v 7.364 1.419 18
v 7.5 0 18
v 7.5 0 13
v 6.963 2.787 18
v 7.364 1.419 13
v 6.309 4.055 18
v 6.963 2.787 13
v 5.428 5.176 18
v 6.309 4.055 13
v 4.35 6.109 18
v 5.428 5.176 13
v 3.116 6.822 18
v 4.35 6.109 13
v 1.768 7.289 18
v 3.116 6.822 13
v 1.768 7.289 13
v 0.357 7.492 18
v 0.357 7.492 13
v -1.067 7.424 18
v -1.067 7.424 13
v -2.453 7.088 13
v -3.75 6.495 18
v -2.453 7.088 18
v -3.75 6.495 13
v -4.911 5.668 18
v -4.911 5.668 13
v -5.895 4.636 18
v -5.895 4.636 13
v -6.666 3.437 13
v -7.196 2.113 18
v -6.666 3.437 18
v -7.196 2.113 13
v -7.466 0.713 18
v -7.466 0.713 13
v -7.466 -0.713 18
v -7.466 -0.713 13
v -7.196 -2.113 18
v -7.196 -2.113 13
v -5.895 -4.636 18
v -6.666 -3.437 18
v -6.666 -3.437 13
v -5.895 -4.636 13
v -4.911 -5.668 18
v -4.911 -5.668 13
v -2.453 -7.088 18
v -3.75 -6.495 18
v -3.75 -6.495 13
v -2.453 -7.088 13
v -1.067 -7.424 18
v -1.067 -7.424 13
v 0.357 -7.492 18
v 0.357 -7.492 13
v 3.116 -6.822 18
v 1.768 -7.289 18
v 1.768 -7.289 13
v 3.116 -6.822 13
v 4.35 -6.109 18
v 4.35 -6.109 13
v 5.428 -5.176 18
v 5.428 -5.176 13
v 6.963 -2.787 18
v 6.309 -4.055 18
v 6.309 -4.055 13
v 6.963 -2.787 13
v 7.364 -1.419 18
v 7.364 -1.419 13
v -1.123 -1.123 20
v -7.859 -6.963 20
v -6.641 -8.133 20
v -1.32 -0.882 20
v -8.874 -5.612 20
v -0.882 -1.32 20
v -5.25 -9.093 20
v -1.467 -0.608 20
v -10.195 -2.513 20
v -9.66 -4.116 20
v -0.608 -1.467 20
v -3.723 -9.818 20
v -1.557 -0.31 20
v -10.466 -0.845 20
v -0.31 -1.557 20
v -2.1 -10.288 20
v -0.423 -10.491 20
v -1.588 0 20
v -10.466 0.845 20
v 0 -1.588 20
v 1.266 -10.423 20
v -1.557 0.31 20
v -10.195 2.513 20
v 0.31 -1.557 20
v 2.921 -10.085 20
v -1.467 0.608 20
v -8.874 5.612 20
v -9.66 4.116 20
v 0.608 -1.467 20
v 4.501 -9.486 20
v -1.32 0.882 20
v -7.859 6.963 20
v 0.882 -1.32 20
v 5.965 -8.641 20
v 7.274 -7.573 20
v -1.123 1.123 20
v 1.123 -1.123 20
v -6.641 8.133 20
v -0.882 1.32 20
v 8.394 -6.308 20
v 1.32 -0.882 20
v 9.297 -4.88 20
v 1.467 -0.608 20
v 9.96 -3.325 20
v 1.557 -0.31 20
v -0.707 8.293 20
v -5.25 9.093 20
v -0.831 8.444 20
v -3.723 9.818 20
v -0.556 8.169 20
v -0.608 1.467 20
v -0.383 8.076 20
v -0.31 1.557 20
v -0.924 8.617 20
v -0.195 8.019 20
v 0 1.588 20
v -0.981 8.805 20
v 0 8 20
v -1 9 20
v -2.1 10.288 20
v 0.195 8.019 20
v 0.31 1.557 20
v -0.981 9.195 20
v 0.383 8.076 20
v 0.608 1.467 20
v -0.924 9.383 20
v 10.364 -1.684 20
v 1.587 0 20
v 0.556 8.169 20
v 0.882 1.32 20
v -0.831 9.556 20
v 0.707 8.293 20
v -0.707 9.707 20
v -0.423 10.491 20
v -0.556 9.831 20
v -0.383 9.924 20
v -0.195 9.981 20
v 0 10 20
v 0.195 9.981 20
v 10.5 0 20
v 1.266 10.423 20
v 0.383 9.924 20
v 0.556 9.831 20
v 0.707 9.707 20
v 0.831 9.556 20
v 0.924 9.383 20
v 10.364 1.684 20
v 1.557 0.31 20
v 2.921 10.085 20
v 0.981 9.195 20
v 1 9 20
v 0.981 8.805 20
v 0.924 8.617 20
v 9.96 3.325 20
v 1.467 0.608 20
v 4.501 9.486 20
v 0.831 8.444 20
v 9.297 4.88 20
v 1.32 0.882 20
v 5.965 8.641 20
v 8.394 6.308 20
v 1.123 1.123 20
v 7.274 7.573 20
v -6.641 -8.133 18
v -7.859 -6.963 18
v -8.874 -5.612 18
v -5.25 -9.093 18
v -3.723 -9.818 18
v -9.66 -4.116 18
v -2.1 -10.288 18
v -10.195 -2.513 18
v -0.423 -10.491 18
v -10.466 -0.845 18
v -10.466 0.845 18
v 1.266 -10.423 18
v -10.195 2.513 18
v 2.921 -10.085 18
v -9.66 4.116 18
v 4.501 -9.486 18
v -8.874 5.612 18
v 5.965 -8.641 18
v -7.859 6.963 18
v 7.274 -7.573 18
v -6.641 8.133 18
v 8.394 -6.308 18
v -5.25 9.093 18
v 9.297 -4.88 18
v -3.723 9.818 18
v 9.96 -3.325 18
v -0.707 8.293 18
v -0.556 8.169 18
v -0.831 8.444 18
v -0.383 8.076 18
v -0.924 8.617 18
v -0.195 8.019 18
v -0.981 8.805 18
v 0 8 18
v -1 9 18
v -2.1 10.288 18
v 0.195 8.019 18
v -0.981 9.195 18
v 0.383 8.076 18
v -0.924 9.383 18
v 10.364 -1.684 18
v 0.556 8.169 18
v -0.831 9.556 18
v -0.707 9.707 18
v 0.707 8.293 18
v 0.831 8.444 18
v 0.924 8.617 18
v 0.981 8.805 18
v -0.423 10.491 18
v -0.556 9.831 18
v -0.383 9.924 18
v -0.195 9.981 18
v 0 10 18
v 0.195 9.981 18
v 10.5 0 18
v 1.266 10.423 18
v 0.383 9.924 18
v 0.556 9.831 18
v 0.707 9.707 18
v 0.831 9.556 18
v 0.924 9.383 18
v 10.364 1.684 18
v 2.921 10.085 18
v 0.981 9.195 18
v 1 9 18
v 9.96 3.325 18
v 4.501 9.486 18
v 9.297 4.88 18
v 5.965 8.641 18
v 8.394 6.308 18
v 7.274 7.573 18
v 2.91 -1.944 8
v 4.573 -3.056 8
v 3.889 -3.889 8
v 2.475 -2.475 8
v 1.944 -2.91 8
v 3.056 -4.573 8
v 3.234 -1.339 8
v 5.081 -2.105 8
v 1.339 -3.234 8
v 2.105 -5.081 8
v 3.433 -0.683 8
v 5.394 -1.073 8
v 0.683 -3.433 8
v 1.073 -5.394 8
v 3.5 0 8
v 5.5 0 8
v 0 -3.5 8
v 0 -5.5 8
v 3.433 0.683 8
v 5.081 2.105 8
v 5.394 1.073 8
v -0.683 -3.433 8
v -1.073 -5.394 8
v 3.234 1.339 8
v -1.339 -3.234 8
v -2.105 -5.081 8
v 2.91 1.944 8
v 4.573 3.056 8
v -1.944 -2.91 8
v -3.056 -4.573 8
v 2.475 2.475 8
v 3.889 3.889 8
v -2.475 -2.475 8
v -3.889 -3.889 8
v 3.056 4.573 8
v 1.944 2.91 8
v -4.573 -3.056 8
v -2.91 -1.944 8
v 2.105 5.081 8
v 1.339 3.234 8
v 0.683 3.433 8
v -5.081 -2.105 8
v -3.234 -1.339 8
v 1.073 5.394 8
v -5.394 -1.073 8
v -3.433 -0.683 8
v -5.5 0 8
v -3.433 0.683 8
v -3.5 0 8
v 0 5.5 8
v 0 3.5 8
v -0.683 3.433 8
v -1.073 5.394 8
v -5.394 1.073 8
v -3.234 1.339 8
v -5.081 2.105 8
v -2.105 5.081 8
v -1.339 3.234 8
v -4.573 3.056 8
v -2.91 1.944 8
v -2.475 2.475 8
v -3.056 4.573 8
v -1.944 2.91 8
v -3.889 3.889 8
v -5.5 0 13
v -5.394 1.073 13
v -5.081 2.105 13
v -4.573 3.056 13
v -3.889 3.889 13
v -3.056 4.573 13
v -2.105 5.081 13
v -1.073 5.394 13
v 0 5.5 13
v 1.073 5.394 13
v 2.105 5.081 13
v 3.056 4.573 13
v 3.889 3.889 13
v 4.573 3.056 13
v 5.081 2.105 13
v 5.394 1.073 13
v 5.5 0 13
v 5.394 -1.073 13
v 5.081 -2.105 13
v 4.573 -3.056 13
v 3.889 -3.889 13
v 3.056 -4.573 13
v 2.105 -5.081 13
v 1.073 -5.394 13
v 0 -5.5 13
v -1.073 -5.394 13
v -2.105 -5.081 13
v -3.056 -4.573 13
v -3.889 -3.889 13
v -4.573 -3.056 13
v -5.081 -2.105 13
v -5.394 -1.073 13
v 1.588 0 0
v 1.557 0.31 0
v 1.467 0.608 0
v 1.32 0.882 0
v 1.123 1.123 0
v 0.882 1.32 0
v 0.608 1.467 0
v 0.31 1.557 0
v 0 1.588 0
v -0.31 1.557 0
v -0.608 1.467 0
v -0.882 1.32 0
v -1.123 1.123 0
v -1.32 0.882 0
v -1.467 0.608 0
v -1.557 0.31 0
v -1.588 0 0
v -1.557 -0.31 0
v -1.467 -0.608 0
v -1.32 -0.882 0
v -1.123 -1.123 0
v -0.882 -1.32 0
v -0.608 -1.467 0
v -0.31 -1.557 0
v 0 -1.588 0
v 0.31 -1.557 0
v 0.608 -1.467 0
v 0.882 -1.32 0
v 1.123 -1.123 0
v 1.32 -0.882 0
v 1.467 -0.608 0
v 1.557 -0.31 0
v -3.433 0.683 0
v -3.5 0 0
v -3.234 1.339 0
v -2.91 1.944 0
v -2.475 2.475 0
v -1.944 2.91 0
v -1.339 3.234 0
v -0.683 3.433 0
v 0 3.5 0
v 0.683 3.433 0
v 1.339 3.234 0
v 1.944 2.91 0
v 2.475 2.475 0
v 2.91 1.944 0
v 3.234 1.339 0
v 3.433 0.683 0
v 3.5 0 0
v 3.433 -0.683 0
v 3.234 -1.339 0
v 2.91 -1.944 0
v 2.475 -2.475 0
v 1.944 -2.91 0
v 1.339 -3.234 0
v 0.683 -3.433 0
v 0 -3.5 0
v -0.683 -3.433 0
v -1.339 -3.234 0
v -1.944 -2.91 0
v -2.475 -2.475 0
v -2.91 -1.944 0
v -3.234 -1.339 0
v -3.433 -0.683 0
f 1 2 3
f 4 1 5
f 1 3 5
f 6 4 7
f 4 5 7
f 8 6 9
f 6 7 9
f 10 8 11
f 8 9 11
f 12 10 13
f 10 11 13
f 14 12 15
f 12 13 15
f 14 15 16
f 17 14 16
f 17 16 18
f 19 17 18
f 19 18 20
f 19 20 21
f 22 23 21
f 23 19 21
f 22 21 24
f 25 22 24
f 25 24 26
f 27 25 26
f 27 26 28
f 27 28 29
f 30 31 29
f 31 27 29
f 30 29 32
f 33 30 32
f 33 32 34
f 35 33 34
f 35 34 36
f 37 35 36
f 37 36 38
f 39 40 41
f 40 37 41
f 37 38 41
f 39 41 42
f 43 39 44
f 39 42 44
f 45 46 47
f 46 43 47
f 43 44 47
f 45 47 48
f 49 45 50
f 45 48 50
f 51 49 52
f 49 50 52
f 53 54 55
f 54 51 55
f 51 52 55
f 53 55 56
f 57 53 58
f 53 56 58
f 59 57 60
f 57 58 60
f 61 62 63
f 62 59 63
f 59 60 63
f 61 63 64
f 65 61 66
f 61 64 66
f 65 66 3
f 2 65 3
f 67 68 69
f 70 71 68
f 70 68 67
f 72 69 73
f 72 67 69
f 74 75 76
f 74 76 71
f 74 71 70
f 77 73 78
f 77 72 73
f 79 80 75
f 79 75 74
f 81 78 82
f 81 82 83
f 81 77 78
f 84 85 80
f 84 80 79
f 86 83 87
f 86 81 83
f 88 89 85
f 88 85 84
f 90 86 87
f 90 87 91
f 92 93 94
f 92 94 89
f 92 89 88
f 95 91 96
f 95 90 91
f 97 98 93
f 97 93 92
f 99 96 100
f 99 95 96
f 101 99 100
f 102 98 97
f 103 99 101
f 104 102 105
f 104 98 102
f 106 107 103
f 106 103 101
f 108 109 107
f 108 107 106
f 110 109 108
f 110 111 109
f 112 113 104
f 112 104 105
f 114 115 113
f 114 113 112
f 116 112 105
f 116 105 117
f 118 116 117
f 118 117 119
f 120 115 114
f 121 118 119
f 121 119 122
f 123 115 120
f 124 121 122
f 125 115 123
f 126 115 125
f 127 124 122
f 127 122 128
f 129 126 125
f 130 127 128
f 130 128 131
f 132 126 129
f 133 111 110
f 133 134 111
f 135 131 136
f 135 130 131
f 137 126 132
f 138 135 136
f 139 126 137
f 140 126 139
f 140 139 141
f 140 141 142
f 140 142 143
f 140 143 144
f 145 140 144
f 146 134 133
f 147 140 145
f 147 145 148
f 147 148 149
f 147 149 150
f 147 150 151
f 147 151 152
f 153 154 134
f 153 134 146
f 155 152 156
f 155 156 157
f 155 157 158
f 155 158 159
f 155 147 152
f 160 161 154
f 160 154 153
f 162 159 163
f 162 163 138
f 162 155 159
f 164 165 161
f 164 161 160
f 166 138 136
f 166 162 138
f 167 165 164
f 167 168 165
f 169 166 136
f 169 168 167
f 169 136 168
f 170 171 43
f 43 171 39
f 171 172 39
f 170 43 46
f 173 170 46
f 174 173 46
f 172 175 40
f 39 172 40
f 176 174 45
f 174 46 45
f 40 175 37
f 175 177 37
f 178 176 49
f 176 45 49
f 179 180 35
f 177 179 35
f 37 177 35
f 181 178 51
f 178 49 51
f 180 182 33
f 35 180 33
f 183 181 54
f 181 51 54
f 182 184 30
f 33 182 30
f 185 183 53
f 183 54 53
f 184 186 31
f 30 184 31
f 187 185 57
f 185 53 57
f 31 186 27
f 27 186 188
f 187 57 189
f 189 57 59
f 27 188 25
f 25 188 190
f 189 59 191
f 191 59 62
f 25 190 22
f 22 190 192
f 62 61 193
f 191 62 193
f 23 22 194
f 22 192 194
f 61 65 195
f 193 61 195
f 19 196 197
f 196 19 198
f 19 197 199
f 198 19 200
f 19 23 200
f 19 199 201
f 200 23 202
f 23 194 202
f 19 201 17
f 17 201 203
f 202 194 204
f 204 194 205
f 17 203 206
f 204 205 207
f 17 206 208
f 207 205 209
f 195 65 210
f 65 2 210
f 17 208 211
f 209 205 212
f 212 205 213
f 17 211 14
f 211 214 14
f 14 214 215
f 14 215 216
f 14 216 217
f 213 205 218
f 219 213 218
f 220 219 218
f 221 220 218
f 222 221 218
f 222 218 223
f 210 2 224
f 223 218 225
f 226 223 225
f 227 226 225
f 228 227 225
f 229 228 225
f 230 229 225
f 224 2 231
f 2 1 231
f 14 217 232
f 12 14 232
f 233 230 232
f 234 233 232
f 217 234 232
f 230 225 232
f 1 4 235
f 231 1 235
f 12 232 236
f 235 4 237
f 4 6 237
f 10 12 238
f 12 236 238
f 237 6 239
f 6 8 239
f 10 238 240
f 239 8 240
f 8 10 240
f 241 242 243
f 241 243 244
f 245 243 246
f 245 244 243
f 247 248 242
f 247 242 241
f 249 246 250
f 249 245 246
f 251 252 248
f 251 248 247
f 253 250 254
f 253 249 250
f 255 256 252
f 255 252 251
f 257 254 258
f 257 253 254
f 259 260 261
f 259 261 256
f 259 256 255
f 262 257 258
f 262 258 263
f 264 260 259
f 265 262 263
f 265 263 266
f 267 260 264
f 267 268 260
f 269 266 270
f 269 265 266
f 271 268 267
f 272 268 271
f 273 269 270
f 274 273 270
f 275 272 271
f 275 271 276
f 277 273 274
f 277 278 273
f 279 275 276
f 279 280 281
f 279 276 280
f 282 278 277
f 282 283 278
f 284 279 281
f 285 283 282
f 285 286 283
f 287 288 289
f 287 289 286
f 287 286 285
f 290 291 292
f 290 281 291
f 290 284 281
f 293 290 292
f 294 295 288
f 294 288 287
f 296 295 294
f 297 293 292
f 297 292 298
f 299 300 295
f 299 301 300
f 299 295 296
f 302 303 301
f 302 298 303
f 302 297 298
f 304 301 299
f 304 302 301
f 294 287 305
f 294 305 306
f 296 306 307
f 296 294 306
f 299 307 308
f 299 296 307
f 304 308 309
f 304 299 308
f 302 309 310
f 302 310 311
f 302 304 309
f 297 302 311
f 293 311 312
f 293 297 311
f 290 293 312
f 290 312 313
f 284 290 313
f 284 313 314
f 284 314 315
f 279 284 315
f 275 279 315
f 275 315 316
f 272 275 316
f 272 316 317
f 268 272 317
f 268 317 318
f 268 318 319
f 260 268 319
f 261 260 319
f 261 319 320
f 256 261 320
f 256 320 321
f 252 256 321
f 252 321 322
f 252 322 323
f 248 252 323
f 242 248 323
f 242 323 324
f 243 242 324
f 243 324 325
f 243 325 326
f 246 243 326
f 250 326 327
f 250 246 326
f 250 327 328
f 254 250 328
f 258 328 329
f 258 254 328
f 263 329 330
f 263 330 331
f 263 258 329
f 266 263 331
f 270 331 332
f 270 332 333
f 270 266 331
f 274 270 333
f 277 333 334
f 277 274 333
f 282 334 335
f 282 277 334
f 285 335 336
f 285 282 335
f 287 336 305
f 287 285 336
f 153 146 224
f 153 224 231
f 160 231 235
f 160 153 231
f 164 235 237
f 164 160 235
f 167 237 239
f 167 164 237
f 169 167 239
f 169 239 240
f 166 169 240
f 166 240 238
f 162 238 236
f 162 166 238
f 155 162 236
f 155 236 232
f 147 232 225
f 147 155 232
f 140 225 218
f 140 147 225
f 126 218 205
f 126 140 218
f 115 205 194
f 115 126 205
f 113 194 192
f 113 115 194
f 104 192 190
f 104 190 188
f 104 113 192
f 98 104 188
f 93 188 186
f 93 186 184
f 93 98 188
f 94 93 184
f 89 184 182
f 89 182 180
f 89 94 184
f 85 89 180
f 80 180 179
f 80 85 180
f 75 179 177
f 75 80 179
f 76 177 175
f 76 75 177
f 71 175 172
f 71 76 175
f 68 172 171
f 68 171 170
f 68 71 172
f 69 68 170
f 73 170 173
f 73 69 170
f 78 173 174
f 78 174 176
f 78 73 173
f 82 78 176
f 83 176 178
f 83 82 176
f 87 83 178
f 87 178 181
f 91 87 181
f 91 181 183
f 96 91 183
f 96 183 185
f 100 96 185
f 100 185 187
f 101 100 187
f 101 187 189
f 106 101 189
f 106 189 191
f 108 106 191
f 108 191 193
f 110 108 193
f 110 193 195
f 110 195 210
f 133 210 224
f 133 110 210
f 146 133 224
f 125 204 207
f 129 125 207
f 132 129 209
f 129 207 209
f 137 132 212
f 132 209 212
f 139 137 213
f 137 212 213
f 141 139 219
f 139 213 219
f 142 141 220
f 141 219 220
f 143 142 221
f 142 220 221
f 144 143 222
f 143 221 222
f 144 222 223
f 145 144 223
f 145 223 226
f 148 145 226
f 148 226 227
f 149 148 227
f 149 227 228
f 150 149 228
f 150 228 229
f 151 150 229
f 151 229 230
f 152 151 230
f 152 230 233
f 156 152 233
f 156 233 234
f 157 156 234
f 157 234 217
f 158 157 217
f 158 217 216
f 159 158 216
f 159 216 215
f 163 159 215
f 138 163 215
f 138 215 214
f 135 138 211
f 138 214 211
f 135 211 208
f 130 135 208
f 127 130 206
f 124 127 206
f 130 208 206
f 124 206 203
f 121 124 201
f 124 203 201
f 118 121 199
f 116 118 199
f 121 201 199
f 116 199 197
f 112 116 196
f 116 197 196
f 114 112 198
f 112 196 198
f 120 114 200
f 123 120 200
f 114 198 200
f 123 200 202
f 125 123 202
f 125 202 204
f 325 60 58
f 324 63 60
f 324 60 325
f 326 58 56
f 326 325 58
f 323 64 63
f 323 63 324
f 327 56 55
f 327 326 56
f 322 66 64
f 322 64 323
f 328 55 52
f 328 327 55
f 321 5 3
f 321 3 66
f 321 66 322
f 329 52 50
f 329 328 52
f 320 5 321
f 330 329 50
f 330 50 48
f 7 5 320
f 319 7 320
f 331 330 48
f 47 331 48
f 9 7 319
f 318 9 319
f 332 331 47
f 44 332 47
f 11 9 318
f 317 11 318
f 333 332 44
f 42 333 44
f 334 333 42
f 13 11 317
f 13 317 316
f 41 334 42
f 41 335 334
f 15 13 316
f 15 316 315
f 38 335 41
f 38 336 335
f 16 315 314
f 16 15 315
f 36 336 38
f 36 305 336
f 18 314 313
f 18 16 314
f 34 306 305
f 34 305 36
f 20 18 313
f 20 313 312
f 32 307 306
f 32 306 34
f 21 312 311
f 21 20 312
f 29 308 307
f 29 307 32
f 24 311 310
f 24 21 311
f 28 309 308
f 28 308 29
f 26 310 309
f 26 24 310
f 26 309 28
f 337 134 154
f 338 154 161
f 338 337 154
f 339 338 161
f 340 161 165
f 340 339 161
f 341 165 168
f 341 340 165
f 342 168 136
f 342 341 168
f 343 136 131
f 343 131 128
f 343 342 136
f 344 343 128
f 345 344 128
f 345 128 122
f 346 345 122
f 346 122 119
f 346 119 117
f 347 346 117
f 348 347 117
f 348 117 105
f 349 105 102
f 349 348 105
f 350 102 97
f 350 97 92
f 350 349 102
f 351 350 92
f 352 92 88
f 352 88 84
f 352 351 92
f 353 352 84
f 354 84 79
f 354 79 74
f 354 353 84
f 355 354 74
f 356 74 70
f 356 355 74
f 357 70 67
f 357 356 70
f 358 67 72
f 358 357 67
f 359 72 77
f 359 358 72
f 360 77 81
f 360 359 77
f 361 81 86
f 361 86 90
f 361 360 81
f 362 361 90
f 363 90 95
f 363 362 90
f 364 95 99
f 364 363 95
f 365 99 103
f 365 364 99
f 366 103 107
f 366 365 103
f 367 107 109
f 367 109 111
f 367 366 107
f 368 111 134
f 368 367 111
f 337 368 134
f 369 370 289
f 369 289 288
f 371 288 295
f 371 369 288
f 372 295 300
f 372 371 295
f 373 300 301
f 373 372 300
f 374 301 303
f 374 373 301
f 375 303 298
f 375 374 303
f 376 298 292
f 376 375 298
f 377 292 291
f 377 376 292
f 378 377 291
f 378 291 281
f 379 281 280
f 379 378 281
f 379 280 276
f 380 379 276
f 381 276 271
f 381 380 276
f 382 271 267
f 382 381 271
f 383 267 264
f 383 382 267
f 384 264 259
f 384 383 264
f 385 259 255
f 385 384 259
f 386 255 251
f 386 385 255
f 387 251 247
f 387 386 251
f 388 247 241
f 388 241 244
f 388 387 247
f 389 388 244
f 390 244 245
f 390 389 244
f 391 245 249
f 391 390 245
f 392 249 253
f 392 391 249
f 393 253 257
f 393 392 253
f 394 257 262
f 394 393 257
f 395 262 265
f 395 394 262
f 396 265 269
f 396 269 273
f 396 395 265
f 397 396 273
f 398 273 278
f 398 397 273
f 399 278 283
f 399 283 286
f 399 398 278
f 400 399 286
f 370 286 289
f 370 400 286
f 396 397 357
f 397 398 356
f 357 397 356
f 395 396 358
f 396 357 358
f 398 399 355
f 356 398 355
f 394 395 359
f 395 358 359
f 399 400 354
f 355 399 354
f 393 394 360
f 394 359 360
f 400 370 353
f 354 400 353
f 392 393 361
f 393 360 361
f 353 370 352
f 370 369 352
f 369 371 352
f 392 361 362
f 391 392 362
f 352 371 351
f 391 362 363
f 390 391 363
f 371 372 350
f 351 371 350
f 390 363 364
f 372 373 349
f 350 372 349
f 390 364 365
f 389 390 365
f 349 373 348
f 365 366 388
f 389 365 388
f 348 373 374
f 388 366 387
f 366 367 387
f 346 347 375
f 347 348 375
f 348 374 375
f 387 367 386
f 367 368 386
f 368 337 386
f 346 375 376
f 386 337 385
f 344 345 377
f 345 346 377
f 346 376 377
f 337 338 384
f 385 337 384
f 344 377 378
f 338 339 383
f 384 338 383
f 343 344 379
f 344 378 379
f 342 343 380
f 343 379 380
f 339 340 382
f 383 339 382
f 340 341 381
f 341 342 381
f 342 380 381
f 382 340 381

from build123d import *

# Parameters (mm, degrees)
SKETCH1_R           = 7.5
SKETCH1_R_2         = 1.5875
BOSS_EXTRUDE1_DEPTH = 20
SKETCH2_R           = 10.5
SKETCH2_R_2         = 7.5
SKETCH2_R_3         = 1.5875
BOSS_EXTRUDE2_DEPTH = 2
SKETCH3_R           = 1
CUT_EXTRUDE1_DEPTH  = 3
SKETCH4_R           = 7.5
SKETCH4_R_2         = 5.5
CUT_EXTRUDE2_DEPTH  = 13
SKETCH5_R           = 5.5
SKETCH5_R_2         = 3.5
CUT_EXTRUDE3_DEPTH  = 8


with BuildPart() as part:
    # Sketch1 → Boss-Extrude1 (new body)
    with BuildSketch(Plane.XY):
        Circle(SKETCH1_R)
        Circle(SKETCH1_R_2, mode=Mode.SUBTRACT)
    extrude(amount=BOSS_EXTRUDE1_DEPTH)

    # Sketch2 → Boss-Extrude2 (add)
    with BuildSketch(Plane.XY.offset(20)):
        Circle(SKETCH2_R)
        Circle(SKETCH2_R_2, mode=Mode.SUBTRACT)
        Circle(SKETCH2_R_2)
        Circle(SKETCH2_R_3, mode=Mode.SUBTRACT)
    extrude(amount=-BOSS_EXTRUDE2_DEPTH)

    # Sketch3 → Cut-Extrude1 (cut, through all)
    with BuildSketch(Plane(origin=(0, 0, 18), x_dir=(-1, 0, 0), z_dir=(0, 0, -1))):
        with Locations((0, 9)):
            Circle(SKETCH3_R)
    extrude(amount=-CUT_EXTRUDE1_DEPTH, mode=Mode.SUBTRACT)

    # Sketch4 → Cut-Extrude2 (cut)
    with BuildSketch(Plane(origin=(0, 0, 0), x_dir=(-1, 0, 0), z_dir=(0, 0, -1))):
        Circle(SKETCH4_R)
        Circle(SKETCH4_R_2, mode=Mode.SUBTRACT)
    extrude(amount=-CUT_EXTRUDE2_DEPTH, mode=Mode.SUBTRACT)

    # Sketch5 → Cut-Extrude3 (cut)
    with BuildSketch(Plane(origin=(0, 0, 0), x_dir=(-1, 0, 0), z_dir=(0, 0, -1))):
        Circle(SKETCH5_R)
        Circle(SKETCH5_R_2, mode=Mode.SUBTRACT)
    extrude(amount=-CUT_EXTRUDE3_DEPTH, mode=Mode.SUBTRACT)


solid = part.part
